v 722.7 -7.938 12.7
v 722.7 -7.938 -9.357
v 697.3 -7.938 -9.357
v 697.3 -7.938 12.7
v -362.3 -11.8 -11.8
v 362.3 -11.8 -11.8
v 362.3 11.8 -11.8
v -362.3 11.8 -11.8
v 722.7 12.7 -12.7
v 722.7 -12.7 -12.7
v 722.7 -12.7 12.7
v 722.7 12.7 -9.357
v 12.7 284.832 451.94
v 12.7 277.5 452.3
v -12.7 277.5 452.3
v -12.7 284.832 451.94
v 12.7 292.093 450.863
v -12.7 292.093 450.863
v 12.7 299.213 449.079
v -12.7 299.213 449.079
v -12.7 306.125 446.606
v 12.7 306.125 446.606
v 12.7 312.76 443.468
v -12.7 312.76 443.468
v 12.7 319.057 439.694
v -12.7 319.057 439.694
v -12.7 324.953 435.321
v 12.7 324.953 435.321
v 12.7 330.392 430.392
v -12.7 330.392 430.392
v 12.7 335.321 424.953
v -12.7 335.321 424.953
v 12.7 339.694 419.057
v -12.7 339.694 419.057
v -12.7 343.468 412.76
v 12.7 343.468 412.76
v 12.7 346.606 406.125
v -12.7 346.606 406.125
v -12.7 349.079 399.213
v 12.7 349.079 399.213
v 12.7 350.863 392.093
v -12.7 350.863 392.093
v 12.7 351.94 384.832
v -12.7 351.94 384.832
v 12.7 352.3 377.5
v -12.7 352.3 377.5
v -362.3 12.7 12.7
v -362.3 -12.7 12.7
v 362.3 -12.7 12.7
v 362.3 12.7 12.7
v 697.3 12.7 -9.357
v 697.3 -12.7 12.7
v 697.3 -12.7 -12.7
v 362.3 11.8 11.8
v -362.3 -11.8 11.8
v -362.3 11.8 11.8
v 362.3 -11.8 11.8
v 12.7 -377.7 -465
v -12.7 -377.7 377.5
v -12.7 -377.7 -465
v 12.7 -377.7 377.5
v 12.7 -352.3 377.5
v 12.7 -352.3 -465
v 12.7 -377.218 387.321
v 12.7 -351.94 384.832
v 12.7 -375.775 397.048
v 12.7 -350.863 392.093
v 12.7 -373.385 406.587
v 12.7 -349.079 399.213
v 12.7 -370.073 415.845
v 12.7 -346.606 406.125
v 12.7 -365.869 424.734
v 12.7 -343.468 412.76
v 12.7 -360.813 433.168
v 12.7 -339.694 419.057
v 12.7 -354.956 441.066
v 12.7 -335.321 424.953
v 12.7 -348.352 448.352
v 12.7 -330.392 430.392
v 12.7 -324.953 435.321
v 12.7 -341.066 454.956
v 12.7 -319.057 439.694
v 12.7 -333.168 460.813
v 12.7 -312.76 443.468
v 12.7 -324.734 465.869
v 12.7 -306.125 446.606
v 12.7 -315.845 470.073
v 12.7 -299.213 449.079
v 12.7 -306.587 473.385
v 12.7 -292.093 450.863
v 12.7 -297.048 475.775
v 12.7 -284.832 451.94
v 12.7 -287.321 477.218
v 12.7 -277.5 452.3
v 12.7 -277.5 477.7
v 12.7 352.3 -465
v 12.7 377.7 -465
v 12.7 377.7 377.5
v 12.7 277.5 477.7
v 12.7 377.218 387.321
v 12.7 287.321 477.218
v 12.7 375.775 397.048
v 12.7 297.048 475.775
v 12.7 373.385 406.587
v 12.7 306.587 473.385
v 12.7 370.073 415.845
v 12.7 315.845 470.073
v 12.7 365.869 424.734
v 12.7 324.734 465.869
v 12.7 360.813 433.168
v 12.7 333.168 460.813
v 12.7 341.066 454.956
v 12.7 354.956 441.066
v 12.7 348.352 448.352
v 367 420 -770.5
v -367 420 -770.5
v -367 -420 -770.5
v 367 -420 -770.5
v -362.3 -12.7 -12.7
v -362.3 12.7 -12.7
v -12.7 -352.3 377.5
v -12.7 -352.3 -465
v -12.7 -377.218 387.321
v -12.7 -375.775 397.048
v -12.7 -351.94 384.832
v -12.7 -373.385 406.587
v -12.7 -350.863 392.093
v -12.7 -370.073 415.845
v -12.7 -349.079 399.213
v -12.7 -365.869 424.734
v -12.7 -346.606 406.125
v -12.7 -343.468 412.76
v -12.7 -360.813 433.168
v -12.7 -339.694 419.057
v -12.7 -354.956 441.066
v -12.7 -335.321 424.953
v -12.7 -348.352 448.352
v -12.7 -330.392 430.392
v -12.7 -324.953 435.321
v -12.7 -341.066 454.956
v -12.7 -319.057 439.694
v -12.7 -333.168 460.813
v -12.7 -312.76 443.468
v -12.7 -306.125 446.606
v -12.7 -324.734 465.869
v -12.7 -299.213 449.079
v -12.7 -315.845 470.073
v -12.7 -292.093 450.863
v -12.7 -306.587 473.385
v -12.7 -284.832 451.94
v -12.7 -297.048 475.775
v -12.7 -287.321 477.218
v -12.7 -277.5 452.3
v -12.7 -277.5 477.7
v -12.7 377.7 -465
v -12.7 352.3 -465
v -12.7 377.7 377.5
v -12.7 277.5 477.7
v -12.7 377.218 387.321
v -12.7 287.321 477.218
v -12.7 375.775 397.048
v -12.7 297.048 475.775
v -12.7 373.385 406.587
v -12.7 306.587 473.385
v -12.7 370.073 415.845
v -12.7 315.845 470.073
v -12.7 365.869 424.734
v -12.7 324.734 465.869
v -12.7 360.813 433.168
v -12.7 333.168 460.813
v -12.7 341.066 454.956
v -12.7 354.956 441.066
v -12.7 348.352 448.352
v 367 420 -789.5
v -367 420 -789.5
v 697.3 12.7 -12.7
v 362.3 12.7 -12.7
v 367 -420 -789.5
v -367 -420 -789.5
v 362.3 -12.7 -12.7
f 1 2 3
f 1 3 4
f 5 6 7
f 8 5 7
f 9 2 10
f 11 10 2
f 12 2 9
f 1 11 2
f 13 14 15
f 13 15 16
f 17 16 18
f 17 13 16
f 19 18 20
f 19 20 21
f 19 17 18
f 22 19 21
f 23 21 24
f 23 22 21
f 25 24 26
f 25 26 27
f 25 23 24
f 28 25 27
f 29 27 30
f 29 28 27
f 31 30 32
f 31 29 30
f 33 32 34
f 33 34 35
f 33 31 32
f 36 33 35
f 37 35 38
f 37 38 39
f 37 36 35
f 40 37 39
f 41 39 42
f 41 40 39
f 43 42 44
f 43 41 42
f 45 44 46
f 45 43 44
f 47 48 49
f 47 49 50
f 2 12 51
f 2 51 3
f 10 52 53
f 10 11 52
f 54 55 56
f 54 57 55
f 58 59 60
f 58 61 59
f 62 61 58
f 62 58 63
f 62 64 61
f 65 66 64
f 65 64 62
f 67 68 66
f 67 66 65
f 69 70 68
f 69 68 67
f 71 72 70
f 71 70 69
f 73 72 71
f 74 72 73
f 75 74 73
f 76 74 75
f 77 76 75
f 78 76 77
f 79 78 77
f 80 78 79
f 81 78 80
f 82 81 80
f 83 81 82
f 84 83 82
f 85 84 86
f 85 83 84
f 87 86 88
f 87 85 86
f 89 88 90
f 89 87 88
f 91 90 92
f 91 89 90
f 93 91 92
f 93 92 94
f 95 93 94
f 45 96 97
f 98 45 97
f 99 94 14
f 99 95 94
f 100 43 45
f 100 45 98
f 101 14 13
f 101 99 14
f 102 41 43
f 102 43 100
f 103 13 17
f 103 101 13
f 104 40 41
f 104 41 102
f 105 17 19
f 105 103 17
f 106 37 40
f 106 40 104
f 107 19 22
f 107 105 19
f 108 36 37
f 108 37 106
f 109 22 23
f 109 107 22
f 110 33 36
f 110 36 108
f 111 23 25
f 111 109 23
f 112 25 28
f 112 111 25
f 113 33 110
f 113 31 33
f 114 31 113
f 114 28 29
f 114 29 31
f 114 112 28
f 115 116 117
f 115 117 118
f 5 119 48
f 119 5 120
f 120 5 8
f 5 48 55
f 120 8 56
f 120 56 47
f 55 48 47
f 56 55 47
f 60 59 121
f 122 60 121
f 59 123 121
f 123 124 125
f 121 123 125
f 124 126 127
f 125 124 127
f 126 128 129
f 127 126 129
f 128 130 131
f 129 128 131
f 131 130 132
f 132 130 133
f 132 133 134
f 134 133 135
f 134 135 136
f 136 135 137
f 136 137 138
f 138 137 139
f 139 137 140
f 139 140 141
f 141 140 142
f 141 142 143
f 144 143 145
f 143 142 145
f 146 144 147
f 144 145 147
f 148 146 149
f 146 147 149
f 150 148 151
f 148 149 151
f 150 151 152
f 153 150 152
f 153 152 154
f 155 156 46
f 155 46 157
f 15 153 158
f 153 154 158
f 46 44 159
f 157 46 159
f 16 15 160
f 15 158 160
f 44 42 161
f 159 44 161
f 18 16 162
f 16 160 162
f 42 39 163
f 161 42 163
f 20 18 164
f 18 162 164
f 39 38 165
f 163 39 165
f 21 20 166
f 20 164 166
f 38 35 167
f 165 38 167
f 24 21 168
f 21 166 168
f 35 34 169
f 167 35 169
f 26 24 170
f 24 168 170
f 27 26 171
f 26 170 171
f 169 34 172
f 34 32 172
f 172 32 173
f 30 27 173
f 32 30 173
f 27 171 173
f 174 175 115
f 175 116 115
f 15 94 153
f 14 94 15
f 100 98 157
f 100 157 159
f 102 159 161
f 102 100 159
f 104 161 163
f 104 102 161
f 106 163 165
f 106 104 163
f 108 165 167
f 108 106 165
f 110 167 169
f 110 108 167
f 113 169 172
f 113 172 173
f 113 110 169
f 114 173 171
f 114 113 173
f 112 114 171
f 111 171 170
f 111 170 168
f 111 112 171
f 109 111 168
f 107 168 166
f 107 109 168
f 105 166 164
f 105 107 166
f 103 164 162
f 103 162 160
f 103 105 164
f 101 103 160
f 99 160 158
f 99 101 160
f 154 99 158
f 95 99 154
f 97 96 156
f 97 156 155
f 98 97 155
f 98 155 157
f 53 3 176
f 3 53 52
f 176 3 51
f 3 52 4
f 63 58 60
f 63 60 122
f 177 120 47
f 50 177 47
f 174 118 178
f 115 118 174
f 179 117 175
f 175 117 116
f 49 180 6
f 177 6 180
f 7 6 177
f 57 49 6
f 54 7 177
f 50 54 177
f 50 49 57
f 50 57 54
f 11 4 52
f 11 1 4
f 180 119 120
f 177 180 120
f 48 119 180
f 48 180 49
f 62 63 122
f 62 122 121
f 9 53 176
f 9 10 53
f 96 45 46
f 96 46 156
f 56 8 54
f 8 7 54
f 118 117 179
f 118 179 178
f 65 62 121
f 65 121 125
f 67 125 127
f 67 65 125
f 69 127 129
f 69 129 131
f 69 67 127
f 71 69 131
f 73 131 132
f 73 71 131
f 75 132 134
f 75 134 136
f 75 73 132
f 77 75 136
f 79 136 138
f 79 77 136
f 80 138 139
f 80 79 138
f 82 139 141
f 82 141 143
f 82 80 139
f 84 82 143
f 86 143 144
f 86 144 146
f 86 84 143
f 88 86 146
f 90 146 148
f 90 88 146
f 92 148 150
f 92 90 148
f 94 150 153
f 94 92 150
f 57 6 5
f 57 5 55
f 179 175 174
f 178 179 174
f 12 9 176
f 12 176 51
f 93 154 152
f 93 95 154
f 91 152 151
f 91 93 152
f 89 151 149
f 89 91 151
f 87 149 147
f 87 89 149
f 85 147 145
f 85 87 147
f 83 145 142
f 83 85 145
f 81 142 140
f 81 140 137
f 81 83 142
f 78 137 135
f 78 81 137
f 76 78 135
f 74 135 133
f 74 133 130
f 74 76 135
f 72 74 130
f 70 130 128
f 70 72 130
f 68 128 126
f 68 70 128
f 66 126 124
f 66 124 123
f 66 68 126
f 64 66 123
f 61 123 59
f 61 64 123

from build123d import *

# Parameters (mm, degrees)
F1_DEPTH = 12.7
F2_W     = 25.4
F2_H     = 25.4
F2_W_2   = 23.6
F2_H_2   = 23.6
F3_DEPTH = 362.3
F6_DEPTH = 12.7
F8_W     = 734
F8_H     = 840
F9_DEPTH = 9.5


with BuildPart() as f1:
    # F0 (on Right) → F1 (new body, symmetric)
    with BuildSketch(Plane.YZ):
        with BuildLine():
            Line((-377.7, 377.5), (-377.7, -465))
            Line((-377.7, -465), (-352.3, -465))
            Line((-352.3, -465), (-352.3, 377.5))
            ThreePointArc((-352.3, 377.5), (-330.391587, 430.391587), (-277.5, 452.3))
            Line((-277.5, 452.3), (277.5, 452.3))
            ThreePointArc((277.5, 452.3), (330.391587, 430.391587), (352.3, 377.5))
            Line((352.3, 377.5), (352.3, -465))
            Line((352.3, -465), (377.7, -465))
            Line((377.7, -465), (377.7, 377.5))
            ThreePointArc((377.7, 377.5), (348.352099, 448.352099), (277.5, 477.7))
            Line((277.5, 477.7), (-277.5, 477.7))
            ThreePointArc((-277.5, 477.7), (-348.352099, 448.352099), (-377.7, 377.5))
        make_face()
    extrude(amount=F1_DEPTH, both=True)


with BuildPart() as f3:
    # F2 (on Right) → F3 (new body, symmetric)
    with BuildSketch(Plane.YZ):
        Rectangle(F2_W, F2_H)
        Rectangle(F2_W_2, F2_H_2, mode=Mode.SUBTRACT)
    extrude(amount=F3_DEPTH, both=True)


with BuildPart() as f6:
    # F5 (on offset) → F6 (new body, symmetric)
    with BuildSketch(Plane.YZ.offset(710)):
        Polygon((-12.7, -12.7), (12.7, -12.7), (12.7, -9.35725), (7.9375, -9.35725), (-7.9375, -9.35725), (-7.9375, 9.35725), (-7.9375, 12.7), (-12.7, 12.7), align=None)
    extrude(amount=F6_DEPTH, both=True)


with BuildPart() as f9:
    # F8 (on offset) → F9 (new body, symmetric)
    with BuildSketch(Plane.XY.offset(-780)):
        Rectangle(F8_W, F8_H)
    extrude(amount=F9_DEPTH, both=True)


solid = Compound([f1.part, f3.part, f6.part, f9.part])
